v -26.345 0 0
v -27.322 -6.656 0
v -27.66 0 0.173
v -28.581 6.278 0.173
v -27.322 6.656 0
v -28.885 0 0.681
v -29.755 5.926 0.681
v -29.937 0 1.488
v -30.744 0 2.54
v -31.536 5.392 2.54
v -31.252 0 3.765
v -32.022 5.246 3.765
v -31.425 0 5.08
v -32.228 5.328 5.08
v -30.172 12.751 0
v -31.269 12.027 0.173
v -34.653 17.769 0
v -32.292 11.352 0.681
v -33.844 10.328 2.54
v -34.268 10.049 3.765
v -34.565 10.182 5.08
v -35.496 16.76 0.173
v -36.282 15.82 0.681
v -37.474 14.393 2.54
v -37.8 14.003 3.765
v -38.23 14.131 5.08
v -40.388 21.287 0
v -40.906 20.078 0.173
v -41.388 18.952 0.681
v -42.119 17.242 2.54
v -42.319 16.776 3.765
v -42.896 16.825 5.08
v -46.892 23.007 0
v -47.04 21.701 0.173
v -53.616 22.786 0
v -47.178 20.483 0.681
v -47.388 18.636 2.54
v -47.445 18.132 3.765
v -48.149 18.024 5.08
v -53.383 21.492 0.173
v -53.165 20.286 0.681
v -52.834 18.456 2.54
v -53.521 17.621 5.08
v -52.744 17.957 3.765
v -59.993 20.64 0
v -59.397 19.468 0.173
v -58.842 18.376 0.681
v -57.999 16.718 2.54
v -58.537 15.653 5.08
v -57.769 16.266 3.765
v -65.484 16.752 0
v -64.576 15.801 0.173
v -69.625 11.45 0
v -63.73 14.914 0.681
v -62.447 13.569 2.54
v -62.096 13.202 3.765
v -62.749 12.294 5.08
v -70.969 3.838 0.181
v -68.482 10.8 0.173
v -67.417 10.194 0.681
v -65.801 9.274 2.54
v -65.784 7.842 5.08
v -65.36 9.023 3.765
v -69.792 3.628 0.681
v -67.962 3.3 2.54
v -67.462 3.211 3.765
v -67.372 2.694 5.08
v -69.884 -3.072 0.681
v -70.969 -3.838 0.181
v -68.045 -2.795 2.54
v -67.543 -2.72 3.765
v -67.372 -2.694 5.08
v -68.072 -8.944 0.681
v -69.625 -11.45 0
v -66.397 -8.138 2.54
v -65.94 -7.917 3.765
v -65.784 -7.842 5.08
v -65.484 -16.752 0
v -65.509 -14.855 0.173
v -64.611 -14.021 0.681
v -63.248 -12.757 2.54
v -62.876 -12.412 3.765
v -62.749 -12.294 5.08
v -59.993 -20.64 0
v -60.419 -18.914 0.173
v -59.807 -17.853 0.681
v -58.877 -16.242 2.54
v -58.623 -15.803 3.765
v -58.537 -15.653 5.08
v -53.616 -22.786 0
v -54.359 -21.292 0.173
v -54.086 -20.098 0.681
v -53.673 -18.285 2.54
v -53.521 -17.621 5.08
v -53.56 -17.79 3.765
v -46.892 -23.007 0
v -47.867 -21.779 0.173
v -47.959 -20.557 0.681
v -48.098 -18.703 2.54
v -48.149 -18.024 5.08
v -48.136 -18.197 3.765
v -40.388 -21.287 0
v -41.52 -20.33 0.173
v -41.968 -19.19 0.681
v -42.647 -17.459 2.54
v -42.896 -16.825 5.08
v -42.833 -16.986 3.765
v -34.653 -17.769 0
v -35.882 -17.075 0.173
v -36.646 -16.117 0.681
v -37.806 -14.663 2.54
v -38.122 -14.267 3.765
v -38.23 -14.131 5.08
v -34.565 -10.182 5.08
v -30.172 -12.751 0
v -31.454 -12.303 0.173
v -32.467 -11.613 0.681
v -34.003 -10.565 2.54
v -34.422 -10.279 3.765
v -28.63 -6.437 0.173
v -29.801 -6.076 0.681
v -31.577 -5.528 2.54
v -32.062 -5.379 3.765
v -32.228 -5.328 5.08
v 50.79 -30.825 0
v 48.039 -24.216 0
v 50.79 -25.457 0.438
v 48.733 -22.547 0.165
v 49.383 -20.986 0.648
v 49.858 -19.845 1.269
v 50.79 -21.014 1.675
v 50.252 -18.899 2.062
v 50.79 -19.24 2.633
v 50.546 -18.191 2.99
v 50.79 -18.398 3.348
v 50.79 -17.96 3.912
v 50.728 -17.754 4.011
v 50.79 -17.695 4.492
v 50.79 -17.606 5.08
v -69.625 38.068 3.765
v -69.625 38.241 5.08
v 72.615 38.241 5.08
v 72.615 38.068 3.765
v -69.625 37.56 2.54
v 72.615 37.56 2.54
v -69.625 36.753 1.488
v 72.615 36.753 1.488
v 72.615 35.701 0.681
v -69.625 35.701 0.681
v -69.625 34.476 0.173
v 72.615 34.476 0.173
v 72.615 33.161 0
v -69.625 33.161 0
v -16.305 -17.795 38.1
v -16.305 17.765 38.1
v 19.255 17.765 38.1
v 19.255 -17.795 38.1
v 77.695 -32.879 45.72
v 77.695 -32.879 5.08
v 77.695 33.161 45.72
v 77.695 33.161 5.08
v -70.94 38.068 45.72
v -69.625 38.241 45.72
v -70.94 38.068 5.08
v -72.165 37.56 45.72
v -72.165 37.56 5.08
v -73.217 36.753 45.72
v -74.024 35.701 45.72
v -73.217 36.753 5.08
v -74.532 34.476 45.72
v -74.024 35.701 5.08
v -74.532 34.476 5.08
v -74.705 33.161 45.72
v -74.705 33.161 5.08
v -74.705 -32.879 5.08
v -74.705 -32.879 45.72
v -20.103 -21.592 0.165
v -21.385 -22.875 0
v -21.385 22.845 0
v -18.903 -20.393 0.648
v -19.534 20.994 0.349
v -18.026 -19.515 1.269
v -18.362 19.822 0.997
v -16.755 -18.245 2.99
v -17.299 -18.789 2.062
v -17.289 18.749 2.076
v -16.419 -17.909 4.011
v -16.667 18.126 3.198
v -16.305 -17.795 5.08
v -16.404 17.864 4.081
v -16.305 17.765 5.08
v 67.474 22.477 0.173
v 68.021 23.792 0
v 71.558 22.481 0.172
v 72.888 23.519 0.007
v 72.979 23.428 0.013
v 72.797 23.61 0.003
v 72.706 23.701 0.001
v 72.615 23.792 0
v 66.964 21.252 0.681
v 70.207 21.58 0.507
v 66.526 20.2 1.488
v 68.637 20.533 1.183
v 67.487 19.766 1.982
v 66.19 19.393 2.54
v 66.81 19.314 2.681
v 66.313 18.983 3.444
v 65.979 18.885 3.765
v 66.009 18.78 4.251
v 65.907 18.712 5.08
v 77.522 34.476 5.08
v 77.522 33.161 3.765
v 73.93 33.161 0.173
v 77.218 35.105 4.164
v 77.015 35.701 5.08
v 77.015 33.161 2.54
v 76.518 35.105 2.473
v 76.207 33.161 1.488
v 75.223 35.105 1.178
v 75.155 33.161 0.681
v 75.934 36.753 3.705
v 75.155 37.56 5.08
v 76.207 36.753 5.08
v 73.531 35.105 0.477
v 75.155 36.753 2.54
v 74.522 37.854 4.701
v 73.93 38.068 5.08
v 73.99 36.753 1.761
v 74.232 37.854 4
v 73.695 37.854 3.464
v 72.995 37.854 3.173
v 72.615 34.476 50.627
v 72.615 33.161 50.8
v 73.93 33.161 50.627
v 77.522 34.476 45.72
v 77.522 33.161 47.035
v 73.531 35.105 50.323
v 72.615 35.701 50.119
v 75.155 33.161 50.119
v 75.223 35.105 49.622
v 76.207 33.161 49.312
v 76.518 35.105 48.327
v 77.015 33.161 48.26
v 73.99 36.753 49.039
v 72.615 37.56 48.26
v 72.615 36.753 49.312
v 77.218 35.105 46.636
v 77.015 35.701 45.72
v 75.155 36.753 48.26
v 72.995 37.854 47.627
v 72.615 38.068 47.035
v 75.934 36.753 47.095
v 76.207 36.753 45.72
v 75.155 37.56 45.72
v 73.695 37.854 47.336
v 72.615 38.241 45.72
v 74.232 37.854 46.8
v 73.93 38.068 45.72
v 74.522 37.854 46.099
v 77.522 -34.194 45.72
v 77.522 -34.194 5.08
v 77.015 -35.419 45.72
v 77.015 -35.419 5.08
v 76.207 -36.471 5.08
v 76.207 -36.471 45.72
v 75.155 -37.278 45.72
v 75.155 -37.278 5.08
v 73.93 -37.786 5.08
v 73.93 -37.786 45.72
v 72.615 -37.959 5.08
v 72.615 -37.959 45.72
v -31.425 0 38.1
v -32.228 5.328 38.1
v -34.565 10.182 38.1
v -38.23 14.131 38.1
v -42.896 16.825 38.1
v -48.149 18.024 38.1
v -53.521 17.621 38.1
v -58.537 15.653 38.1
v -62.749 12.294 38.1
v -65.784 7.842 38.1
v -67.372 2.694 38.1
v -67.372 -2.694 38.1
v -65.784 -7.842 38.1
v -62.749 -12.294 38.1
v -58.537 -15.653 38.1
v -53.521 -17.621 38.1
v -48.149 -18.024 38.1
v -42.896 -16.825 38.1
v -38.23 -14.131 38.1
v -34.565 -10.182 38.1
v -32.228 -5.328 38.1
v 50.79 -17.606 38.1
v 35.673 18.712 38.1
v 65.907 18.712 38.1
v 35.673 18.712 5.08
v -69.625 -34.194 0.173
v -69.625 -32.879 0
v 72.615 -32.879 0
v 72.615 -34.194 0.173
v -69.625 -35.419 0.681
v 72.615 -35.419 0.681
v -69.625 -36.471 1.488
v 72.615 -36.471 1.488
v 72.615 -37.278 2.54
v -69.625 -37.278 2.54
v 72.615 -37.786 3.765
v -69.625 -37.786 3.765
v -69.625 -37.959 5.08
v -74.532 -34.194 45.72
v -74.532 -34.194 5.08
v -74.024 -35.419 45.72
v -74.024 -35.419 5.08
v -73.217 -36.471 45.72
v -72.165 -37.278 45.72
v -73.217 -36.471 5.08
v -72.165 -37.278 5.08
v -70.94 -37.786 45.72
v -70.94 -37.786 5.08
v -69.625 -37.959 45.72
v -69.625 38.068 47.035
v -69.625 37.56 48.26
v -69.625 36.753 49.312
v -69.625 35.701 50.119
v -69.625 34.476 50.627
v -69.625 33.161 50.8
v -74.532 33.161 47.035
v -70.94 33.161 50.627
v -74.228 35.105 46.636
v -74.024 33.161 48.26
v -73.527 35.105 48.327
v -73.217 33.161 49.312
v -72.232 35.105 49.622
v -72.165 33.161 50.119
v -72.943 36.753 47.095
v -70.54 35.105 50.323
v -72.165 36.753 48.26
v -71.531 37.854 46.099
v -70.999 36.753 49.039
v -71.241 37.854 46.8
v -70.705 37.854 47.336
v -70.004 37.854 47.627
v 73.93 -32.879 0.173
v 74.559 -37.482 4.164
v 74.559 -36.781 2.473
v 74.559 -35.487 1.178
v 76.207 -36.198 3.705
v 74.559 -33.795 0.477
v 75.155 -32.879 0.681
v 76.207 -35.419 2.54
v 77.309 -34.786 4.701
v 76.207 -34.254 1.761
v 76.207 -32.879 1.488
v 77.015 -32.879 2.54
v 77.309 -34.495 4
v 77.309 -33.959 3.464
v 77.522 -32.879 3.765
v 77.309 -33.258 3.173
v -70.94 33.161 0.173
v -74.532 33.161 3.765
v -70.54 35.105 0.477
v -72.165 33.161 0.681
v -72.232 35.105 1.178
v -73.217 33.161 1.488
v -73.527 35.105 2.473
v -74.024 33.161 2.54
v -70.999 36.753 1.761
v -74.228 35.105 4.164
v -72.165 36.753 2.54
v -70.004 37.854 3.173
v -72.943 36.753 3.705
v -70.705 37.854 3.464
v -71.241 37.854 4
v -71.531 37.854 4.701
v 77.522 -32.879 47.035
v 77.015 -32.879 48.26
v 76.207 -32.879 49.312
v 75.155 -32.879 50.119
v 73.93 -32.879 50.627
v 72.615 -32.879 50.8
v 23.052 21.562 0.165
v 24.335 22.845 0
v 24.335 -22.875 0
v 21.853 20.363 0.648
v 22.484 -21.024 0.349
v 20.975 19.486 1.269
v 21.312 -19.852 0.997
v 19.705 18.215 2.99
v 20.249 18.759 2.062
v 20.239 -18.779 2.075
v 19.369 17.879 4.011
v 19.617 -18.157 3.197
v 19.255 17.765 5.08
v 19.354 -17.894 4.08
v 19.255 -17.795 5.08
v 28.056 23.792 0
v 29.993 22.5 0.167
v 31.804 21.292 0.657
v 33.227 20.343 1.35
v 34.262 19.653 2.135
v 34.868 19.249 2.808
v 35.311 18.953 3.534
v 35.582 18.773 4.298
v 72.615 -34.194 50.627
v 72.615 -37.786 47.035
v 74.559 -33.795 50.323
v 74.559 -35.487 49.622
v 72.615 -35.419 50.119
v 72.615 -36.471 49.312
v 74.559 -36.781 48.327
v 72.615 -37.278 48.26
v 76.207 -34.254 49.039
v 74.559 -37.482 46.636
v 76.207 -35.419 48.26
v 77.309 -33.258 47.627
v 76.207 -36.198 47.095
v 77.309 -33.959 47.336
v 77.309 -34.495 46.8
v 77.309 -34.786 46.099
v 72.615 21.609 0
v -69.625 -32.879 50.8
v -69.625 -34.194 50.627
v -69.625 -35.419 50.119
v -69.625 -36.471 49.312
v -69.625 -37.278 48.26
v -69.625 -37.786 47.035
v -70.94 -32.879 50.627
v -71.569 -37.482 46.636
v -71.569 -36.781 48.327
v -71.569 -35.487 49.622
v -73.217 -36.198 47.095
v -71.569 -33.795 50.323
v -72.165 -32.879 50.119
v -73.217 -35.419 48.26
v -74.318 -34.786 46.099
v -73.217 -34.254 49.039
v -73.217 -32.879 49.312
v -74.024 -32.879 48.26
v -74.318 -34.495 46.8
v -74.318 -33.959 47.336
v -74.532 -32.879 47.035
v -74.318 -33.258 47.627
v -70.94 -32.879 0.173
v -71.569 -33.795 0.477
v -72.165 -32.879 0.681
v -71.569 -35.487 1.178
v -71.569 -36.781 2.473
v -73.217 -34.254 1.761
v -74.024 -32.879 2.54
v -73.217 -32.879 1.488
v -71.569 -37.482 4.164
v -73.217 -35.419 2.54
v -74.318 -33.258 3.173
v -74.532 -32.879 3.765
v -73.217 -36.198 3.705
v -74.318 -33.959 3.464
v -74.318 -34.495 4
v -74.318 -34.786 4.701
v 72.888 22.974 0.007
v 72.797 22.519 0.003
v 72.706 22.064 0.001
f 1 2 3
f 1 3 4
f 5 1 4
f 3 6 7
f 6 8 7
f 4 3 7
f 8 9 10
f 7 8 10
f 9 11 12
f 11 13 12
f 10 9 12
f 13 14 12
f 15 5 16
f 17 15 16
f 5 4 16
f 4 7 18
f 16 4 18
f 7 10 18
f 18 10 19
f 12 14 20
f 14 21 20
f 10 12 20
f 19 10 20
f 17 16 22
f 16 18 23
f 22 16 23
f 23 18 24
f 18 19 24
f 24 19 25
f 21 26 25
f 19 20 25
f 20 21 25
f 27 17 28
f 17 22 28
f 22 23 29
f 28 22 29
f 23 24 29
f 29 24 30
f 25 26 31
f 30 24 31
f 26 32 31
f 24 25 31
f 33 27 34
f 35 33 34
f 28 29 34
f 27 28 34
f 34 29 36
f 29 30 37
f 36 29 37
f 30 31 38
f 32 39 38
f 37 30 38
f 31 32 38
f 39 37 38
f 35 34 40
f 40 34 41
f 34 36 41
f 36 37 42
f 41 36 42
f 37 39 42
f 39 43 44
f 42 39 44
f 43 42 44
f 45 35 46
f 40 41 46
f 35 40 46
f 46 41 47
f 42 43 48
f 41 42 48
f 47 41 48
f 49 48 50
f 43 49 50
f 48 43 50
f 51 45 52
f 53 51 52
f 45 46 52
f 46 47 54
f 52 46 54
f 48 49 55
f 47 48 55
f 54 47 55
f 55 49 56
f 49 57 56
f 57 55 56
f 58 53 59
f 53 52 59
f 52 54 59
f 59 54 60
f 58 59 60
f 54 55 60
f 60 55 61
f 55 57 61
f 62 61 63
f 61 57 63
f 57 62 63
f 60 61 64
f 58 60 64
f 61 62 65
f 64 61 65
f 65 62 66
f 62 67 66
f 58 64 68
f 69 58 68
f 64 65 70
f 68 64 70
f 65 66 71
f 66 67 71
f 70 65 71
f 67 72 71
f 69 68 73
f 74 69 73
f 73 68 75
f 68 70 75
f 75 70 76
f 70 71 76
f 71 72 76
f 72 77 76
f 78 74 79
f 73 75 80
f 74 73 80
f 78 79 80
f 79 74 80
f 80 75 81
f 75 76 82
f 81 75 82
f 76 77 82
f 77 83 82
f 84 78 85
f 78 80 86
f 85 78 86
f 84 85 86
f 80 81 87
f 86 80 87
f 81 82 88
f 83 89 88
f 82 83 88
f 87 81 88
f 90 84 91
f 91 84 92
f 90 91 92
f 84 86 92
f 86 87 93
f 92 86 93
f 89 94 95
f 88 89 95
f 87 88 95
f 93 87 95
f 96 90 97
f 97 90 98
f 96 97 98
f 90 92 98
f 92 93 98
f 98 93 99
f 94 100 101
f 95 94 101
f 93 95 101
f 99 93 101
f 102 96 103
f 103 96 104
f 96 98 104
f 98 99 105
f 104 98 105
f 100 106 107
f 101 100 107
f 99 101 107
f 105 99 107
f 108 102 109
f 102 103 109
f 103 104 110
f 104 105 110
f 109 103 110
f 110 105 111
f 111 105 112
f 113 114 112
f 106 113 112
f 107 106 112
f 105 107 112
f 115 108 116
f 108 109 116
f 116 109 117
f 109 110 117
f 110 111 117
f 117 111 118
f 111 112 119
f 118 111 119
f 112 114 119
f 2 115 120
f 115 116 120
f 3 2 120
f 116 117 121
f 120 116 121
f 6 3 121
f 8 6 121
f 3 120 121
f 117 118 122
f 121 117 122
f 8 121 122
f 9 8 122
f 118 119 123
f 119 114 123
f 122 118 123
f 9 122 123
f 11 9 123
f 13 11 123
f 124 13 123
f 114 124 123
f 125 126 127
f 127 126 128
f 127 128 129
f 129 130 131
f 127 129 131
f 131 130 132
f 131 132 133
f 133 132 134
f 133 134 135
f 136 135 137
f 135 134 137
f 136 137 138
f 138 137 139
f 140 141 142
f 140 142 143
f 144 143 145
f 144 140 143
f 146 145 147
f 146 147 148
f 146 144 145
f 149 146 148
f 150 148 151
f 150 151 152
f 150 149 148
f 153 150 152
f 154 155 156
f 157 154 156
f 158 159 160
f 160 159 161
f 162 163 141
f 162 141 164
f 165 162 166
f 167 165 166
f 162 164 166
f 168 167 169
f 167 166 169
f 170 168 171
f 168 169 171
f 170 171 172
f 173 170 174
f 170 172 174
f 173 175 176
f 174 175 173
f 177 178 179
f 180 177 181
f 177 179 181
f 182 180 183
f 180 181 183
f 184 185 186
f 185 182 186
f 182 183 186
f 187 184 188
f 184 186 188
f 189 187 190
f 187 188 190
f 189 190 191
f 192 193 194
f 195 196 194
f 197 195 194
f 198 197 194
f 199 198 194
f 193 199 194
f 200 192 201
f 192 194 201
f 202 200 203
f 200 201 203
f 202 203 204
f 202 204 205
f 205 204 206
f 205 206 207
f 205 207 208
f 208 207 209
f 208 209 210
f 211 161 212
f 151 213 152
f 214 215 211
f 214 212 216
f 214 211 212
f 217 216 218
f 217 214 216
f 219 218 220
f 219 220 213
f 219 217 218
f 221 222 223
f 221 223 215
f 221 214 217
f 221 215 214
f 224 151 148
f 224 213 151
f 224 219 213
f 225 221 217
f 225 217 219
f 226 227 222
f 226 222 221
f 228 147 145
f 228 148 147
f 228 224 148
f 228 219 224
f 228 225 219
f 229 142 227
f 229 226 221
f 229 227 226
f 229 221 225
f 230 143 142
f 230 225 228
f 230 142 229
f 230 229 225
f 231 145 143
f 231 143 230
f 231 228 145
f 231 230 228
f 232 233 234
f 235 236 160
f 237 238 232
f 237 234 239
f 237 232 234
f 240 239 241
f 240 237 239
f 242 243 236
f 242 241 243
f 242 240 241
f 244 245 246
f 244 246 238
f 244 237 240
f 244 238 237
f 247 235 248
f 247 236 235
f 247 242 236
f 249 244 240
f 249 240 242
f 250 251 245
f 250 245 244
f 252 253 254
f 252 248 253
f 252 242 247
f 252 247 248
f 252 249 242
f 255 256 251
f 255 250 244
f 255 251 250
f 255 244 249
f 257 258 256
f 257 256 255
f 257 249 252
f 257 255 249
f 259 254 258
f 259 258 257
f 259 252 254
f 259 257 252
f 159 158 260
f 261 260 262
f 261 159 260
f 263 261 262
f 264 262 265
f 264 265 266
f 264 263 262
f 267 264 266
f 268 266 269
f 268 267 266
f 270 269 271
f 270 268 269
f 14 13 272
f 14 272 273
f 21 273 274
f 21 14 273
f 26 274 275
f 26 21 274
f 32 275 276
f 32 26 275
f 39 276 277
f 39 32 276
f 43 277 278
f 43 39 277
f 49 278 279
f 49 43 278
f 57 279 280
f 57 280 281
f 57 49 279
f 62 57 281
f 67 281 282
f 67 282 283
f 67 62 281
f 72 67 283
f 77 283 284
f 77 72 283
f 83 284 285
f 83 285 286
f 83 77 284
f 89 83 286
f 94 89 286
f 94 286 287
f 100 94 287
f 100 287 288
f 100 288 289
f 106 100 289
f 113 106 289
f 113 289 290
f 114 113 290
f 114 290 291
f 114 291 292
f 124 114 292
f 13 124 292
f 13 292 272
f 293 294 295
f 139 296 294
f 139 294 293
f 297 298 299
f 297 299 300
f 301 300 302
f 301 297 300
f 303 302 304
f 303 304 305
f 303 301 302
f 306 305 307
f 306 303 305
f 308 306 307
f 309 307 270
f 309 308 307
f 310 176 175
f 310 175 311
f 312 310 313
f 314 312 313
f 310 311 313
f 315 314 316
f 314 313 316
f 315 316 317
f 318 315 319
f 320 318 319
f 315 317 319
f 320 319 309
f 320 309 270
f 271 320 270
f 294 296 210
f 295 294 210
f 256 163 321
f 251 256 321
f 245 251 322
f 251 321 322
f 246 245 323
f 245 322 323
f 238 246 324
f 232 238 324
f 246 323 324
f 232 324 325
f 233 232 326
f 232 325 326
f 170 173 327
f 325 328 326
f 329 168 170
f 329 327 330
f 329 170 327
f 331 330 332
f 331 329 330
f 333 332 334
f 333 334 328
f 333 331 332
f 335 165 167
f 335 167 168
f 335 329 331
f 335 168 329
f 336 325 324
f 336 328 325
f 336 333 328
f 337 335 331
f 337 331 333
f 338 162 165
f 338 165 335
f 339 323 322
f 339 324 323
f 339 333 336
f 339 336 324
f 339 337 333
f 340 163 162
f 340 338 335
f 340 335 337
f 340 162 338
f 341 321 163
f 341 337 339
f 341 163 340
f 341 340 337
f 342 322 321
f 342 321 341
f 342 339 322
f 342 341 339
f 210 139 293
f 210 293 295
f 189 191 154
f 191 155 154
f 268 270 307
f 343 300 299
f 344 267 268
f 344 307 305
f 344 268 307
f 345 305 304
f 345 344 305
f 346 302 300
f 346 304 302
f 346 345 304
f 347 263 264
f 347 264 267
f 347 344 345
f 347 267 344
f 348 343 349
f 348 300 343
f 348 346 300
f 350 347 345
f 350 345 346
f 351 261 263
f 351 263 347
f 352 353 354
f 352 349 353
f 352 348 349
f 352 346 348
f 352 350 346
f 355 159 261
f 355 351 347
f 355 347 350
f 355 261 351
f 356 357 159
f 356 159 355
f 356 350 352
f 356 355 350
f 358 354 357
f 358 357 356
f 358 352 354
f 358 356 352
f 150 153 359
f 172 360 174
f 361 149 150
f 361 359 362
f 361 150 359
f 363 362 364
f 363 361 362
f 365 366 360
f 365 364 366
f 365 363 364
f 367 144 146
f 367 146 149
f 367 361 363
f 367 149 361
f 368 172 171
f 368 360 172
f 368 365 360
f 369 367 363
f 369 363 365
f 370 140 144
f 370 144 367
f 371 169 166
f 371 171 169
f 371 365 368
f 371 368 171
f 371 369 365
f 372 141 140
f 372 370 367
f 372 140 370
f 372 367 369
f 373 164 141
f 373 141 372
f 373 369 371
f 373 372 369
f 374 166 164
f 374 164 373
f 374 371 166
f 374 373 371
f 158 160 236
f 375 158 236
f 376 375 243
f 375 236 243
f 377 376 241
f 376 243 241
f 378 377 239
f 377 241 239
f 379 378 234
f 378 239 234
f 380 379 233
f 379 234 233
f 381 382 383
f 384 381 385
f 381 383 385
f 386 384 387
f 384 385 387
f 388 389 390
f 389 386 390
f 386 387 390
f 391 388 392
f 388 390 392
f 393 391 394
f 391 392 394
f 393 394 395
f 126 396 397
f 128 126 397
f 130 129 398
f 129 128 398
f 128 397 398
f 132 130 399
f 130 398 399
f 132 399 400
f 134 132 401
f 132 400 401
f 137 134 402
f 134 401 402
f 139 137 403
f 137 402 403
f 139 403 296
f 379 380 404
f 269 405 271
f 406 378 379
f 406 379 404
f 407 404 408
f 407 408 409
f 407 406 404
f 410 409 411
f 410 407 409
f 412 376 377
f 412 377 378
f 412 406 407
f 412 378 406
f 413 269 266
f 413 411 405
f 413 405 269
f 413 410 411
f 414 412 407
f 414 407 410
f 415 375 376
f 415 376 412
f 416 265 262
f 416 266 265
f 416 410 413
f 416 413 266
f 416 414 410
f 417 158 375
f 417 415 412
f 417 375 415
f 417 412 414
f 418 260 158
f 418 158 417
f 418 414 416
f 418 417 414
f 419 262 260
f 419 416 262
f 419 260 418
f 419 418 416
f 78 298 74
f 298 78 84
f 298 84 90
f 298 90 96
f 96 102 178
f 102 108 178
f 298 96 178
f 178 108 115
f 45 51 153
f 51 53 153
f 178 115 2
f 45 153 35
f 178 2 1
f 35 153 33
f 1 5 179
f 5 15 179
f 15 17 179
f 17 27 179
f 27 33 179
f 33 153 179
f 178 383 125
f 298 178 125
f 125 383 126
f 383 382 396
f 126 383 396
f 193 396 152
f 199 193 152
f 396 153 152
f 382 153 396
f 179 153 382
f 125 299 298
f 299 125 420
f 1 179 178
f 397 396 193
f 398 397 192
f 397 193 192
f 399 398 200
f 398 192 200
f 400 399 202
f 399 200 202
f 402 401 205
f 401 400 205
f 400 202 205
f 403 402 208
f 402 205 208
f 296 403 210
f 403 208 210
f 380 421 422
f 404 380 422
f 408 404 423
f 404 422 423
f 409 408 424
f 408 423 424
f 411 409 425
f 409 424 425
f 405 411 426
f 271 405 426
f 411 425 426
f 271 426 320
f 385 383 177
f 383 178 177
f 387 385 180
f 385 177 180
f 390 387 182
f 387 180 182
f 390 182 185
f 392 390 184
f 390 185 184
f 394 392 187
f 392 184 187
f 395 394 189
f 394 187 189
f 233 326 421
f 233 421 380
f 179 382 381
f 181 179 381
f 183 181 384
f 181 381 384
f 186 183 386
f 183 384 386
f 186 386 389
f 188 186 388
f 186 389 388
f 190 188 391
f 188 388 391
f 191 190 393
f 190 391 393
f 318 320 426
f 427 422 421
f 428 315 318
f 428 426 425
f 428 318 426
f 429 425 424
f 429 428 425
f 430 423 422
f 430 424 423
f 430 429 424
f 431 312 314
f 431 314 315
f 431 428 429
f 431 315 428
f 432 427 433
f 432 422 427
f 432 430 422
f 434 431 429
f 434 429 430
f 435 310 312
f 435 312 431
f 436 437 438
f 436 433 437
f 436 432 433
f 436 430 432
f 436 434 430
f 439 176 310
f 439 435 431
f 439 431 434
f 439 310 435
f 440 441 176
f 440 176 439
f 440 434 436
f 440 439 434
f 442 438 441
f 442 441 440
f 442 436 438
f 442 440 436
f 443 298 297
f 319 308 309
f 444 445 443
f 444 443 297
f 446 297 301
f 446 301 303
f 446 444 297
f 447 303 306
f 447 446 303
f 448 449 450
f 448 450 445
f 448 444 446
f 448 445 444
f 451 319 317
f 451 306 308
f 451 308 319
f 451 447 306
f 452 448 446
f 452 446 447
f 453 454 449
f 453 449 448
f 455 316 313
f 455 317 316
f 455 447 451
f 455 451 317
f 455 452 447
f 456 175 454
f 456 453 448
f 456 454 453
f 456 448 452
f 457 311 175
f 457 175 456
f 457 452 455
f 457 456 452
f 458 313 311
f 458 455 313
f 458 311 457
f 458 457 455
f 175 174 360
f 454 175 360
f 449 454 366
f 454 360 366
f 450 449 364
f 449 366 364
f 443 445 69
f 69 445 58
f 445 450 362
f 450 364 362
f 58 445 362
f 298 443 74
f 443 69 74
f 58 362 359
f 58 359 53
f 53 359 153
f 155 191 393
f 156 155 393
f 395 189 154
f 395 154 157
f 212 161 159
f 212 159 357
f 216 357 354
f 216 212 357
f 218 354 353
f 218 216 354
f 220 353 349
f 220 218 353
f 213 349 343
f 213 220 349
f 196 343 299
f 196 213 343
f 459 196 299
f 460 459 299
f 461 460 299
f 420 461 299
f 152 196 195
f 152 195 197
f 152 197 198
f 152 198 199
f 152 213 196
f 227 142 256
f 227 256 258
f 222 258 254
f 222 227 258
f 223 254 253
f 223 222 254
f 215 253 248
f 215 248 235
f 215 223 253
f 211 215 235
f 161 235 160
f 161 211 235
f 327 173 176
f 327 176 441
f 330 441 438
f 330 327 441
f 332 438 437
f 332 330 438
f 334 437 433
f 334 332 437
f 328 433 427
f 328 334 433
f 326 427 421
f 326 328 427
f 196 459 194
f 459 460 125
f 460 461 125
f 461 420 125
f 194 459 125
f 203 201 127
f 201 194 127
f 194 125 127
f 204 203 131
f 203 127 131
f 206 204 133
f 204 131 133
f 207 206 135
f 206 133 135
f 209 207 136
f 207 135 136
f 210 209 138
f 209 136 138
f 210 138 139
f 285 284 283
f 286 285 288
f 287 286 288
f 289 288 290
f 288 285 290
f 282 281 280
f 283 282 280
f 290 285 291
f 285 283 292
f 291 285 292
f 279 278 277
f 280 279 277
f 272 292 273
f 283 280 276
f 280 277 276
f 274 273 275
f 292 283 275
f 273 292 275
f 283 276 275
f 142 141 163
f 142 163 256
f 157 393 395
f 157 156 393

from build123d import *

# Parameters (mm, degrees)
F0_W          = 152.4
F0_H          = 76.2
F1_DEPTH      = 50.8
F2_R          = 18.0745305817
F3_DEPTH      = 38.1
F6_DEPTH      = 38.1
F4_W          = 35.56
F4_H          = 35.56
F7_DEPTH      = 38.1
F8_T1_DEPTH   = 35.56
F8_T3_DEPTH   = 35.56
F8_T5_DEPTH   = 142.24
F8_T7_DEPTH   = 66.04
F8_T9_DEPTH   = 40.64
F8_S13_W      = 5.08
F8_S13_H      = 5.08
F8_T14_DEPTH  = 5.08
F8_S19_W      = 5.08
F8_S19_H      = 5.08
F8_T20_DEPTH  = 5.08
F8_S25_W      = 5.08
F8_S25_H      = 5.08
F8_T26_DEPTH  = 5.08
F8_S31_W      = 5.08
F8_S31_H      = 5.08
F8_T32_DEPTH  = 5.08
F8_S37_W      = 5.08
F8_S37_H      = 5.08
F8_T38_DEPTH  = 5.08
F8_S43_W      = 5.08
F8_S43_H      = 5.08
F8_T44_DEPTH  = 5.08
F8_S49_W      = 5.08
F8_S49_H      = 5.08
F8_T50_DEPTH  = 5.08
F8_S55_W      = 5.08
F8_S55_H      = 5.08
F8_T56_DEPTH  = 5.08
F8_T64_DEPTH  = 64.7384888256
F8_T70_DEPTH  = 64.7384888256
F8_T76_DEPTH  = 55.6341915667
F8_T83_DEPTH  = 48.26
F8_T87_DEPTH  = 48.26
F8_T94_DEPTH  = 48.26
F8_T98_DEPTH  = 48.26
F8_T105_DEPTH = 48.26
F8_T109_DEPTH = 48.26
F8_T116_DEPTH = 48.26
F8_T120_DEPTH = 48.26
F8_T127_DEPTH = 64.7384888256
F8_T131_DEPTH = 55.6341915667
F8_T138_DEPTH = 64.7384888256
F8_T142_DEPTH = 64.7384888256
F8_T149_DEPTH = 55.6341915667
F8_T153_DEPTH = 64.7384888256


# Not quite as in the source:
# - a fillet or chamfer that OpenCascade refuses, or shapes differently, is made with other operations: its cross-section is extruded or revolved along the edge and cut away or added


with BuildPart() as f1:
    # F0 (on Top) → F1 (new body)
    with BuildSketch(Plane.XY):
        with Locations((1.4952687383, 0.1409448402)):
            Rectangle(F0_W, F0_H)
    extrude(amount=F1_DEPTH)

    # F2 (on Top) → F3 (cut)
    with BuildSketch(Plane.XY):
        with Locations((-49.4992733002, 0)):
            Circle(F2_R)
    extrude(amount=F3_DEPTH, mode=Mode.SUBTRACT)

    # F5 (on Top) → F6 (cut)
    with BuildSketch(Plane.XY):
        Polygon((50.7897567004, 18.7120139599), (35.672660917, 18.7120139599), (50.7897567004, -17.6058895886), align=None)
        Polygon((65.9068524837, 18.7120139599), (50.7897567004, 18.7120139599), (50.7897567004, -17.6058895886), align=None)
    extrude(amount=F6_DEPTH, mode=Mode.SUBTRACT)

    # F4 (on Top) → F7 (cut)
    with BuildSketch(Plane.XY):
        with Locations((1.4748377725, -0.014944126)):
            Rectangle(F4_W, F4_H)
    extrude(amount=F7_DEPTH, mode=Mode.SUBTRACT)

    # F8: fillet of radius 5.08 on 20 edges, made by hand

    # F8_s2 → F8_t1 (cut)
    with BuildSketch(Plane.YZ.offset(-16.3051622275)):
        with BuildLine():
            ThreePointArc((-22.874944126, 0), (-19.2828416775, 1.4878975516), (-17.794944126, 5.08))
            Line((-17.794944126, 5.08), (-17.794944126, 0))
            Line((-17.794944126, 0), (-22.874944126, 0))
        make_face()
        with BuildLine():
            ThreePointArc((22.845055874, 0), (19.2529534256, 1.4878975516), (17.765055874, 5.08))
            Line((17.765055874, 5.08), (17.765055874, 0))
            Line((17.765055874, 0), (22.845055874, 0))
        make_face()
    extrude(amount=F8_T1_DEPTH, mode=Mode.SUBTRACT)

    # F8_s4 → F8_t3 (cut)
    with BuildSketch(Plane.XZ.offset(-17.765055874)):
        with BuildLine():
            ThreePointArc((-21.3851622275, 0), (-17.793059779, 1.4878975516), (-16.3051622275, 5.08))
            Line((-16.3051622275, 5.08), (-16.3051622275, 0))
            Line((-16.3051622275, 0), (-21.3851622275, 0))
        make_face()
        with BuildLine():
            ThreePointArc((24.3348377725, 0), (20.7427353241, 1.4878975516), (19.2548377725, 5.08))
            Line((19.2548377725, 5.08), (19.2548377725, 0))
            Line((19.2548377725, 0), (24.3348377725, 0))
        make_face()
    extrude(amount=F8_T3_DEPTH, mode=Mode.SUBTRACT)

    # F8_s6 → F8_t5 (cut)
    with BuildSketch(Plane.YZ.offset(-69.6247312617)):
        with BuildLine():
            ThreePointArc((38.2409448402, 5.08), (36.7530472886, 1.4878975516), (33.1609448402, 0))
            Line((33.1609448402, 0), (38.2409448402, 0))
            Line((38.2409448402, 0), (38.2409448402, 5.08))
        make_face()
        with BuildLine():
            ThreePointArc((-32.8790551598, 0), (-36.4711576083, 1.4878975516), (-37.9590551598, 5.08))
            Line((-37.9590551598, 5.08), (-37.9590551598, 0))
            Line((-37.9590551598, 0), (-32.8790551598, 0))
        make_face()
        with BuildLine():
            ThreePointArc((38.2409448402, 45.72), (36.7530472886, 49.3121024484), (33.1609448402, 50.8))
            Line((33.1609448402, 50.8), (38.2409448402, 50.8))
            Line((38.2409448402, 50.8), (38.2409448402, 45.72))
        make_face()
        with BuildLine():
            ThreePointArc((-32.8790551598, 50.8), (-36.4711576083, 49.3121024484), (-37.9590551598, 45.72))
            Line((-37.9590551598, 45.72), (-37.9590551598, 50.8))
            Line((-37.9590551598, 50.8), (-32.8790551598, 50.8))
        make_face()
    extrude(amount=F8_T5_DEPTH, mode=Mode.SUBTRACT)

    # F8_s8 → F8_t7 (cut)
    with BuildSketch(Plane.XZ.offset(-33.1609448402)):
        with BuildLine():
            ThreePointArc((77.6952687383, 5.08), (76.2073711867, 1.4878975516), (72.6152687383, 0))
            Line((72.6152687383, 0), (77.6952687383, 0))
            Line((77.6952687383, 0), (77.6952687383, 5.08))
        make_face()
        with BuildLine():
            ThreePointArc((-74.7047312617, 5.08), (-73.2168337102, 1.4878975516), (-69.6247312617, 0))
            Line((-69.6247312617, 0), (-74.7047312617, 0))
            Line((-74.7047312617, 0), (-74.7047312617, 5.08))
        make_face()
        with BuildLine():
            ThreePointArc((-74.7047312617, 45.72), (-73.2168337102, 49.3121024484), (-69.6247312617, 50.8))
            Line((-69.6247312617, 50.8), (-74.7047312617, 50.8))
            Line((-74.7047312617, 50.8), (-74.7047312617, 45.72))
        make_face()
        with BuildLine():
            ThreePointArc((77.6952687383, 45.72), (76.2073711867, 49.3121024484), (72.6152687383, 50.8))
            Line((72.6152687383, 50.8), (77.6952687383, 50.8))
            Line((77.6952687383, 50.8), (77.6952687383, 45.72))
        make_face()
    extrude(amount=F8_T7_DEPTH, mode=Mode.SUBTRACT)

    # F8_s10 → F8_t9 (cut)
    with BuildSketch(Plane.XY.offset(5.08)):
        with BuildLine():
            ThreePointArc((72.6152687383, 38.2409448402), (76.2073711867, 36.7530472886), (77.6952687383, 33.1609448402))
            Line((77.6952687383, 33.1609448402), (77.6952687383, 38.2409448402))
            Line((77.6952687383, 38.2409448402), (72.6152687383, 38.2409448402))
        make_face()
        with BuildLine():
            ThreePointArc((77.6952687383, -32.8790551598), (76.2073711867, -36.4711576083), (72.6152687383, -37.9590551598))
            Line((72.6152687383, -37.9590551598), (77.6952687383, -37.9590551598))
            Line((77.6952687383, -37.9590551598), (77.6952687383, -32.8790551598))
        make_face()
        with BuildLine():
            ThreePointArc((-74.7047312617, -32.8790551598), (-73.2168337102, -36.4711576083), (-69.6247312617, -37.9590551598))
            Line((-69.6247312617, -37.9590551598), (-74.7047312617, -37.9590551598))
            Line((-74.7047312617, -37.9590551598), (-74.7047312617, -32.8790551598))
        make_face()
        with BuildLine():
            ThreePointArc((-69.6247312617, 38.2409448402), (-73.2168337102, 36.7530472886), (-74.7047312617, 33.1609448402))
            Line((-74.7047312617, 33.1609448402), (-74.7047312617, 38.2409448402))
            Line((-74.7047312617, 38.2409448402), (-69.6247312617, 38.2409448402))
        make_face()
    extrude(amount=F8_T9_DEPTH, mode=Mode.SUBTRACT)


with BuildPart() as f8_tool12:
    # F8_s13 → F8_t14 (new body)
    with BuildSketch(Plane.XZ.offset(-33.1609448402)):
        with Locations((75.1552687383, 2.54)):
            Rectangle(F8_S13_W, F8_S13_H)
    extrude(amount=-F8_T14_DEPTH)

    # F8_s15 → F8_t16 (revolve, cut)
    with BuildSketch(Plane(origin=(72.6152687383, 33.1609448402, 5.08), x_dir=(-0.7071067812, 0, 0.7071067812), z_dir=(-0.7071067812, 0, -0.7071067812))):
        with BuildLine():
            ThreePointArc((0, -5.08), (5.08, 0), (0, 5.08))
            Line((0, 5.08), (0, -5.08))
        make_face()
    revolve(axis=Axis((72.6152687383, 33.1609448402, 5.08), (0, 1, 0)), mode=Mode.SUBTRACT)


with BuildPart() as f1_1:
    add(f1.part)

    # F8_t11: cut F8_tool12
    add(f8_tool12.part, mode=Mode.SUBTRACT)


with BuildPart() as f8_tool18:
    # F8_s19 → F8_t20 (new body)
    with BuildSketch(Plane.XZ.offset(-33.1609448402)):
        with Locations((-72.1647312617, 2.54)):
            Rectangle(F8_S19_W, F8_S19_H)
    extrude(amount=-F8_T20_DEPTH)

    # F8_s21 → F8_t22 (revolve, cut)
    with BuildSketch(Plane(origin=(-69.6247312617, 33.1609448402, 5.08), x_dir=(0.7071067812, 0, 0.7071067812), z_dir=(-0.7071067812, 0, 0.7071067812))):
        with BuildLine():
            ThreePointArc((0, -5.08), (5.08, 0), (0, 5.08))
            Line((0, 5.08), (0, -5.08))
        make_face()
    revolve(axis=Axis((-69.6247312617, 33.1609448402, 5.08), (0, 1, 0)), mode=Mode.SUBTRACT)


with BuildPart() as f1_2:
    add(f1_1.part)

    # F8_t17: cut F8_tool18
    add(f8_tool18.part, mode=Mode.SUBTRACT)


with BuildPart() as f8_tool24:
    # F8_s25 → F8_t26 (new body)
    with BuildSketch(Plane.YZ.offset(72.6152687383)):
        with Locations((-35.4190551598, 2.54)):
            Rectangle(F8_S25_W, F8_S25_H)
    extrude(amount=F8_T26_DEPTH)

    # F8_s27 → F8_t28 (revolve, cut)
    with BuildSketch(Plane(origin=(72.6152687383, -32.8790551598, 5.08), x_dir=(0, 0.7071067812, 0.7071067812), z_dir=(0, 0.7071067812, -0.7071067812))):
        with BuildLine():
            ThreePointArc((0, -5.08), (5.08, 0), (0, 5.08))
            Line((0, 5.08), (0, -5.08))
        make_face()
    revolve(axis=Axis((72.6152687383, -32.8790551598, 5.08), (1, 0, 0)), mode=Mode.SUBTRACT)


with BuildPart() as f1_3:
    add(f1_2.part)

    # F8_t23: cut F8_tool24
    add(f8_tool24.part, mode=Mode.SUBTRACT)


with BuildPart() as f8_tool30:
    # F8_s31 → F8_t32 (new body)
    with BuildSketch(Plane.YZ.offset(-69.6247312617)):
        with Locations((-35.4190551598, 2.54)):
            Rectangle(F8_S31_W, F8_S31_H)
    extrude(amount=-F8_T32_DEPTH)

    # F8_s33 → F8_t34 (revolve, cut)
    with BuildSketch(Plane(origin=(-69.6247312617, -32.8790551598, 5.08), x_dir=(0, 0.7071067812, 0.7071067812), z_dir=(0, -0.7071067812, 0.7071067812))):
        with BuildLine():
            ThreePointArc((0, -5.08), (5.08, 0), (0, 5.08))
            Line((0, 5.08), (0, -5.08))
        make_face()
    revolve(axis=Axis((-69.6247312617, -32.8790551598, 5.08), (-1, 0, 0)), mode=Mode.SUBTRACT)


with BuildPart() as f1_4:
    add(f1_3.part)

    # F8_t29: cut F8_tool30
    add(f8_tool30.part, mode=Mode.SUBTRACT)


with BuildPart() as f8_tool36:
    # F8_s37 → F8_t38 (new body)
    with BuildSketch(Plane.XZ.offset(-33.1609448402)):
        with Locations((75.1552687383, 48.26)):
            Rectangle(F8_S37_W, F8_S37_H)
    extrude(amount=-F8_T38_DEPTH)

    # F8_s39 → F8_t40 (revolve, cut)
    with BuildSketch(Plane(origin=(72.6152687383, 33.1609448402, 45.72), x_dir=(-0.7071067812, 0, -0.7071067812), z_dir=(0.7071067812, 0, -0.7071067812))):
        with BuildLine():
            ThreePointArc((0, -5.08), (5.08, 0), (0, 5.08))
            Line((0, 5.08), (0, -5.08))
        make_face()
    revolve(axis=Axis((72.6152687383, 33.1609448402, 45.72), (0, 1, 0)), mode=Mode.SUBTRACT)


with BuildPart() as f1_5:
    add(f1_4.part)

    # F8_t35: cut F8_tool36
    add(f8_tool36.part, mode=Mode.SUBTRACT)


with BuildPart() as f8_tool42:
    # F8_s43 → F8_t44 (new body)
    with BuildSketch(Plane.YZ.offset(72.6152687383)):
        with Locations((-35.4190551598, 48.26)):
            Rectangle(F8_S43_W, F8_S43_H)
    extrude(amount=F8_T44_DEPTH)

    # F8_s45 → F8_t46 (revolve, cut)
    with BuildSketch(Plane(origin=(72.6152687383, -32.8790551598, 45.72), x_dir=(0, 0.7071067812, -0.7071067812), z_dir=(0, -0.7071067812, -0.7071067812))):
        with BuildLine():
            ThreePointArc((0, -5.08), (5.08, 0), (0, 5.08))
            Line((0, 5.08), (0, -5.08))
        make_face()
    revolve(axis=Axis((72.6152687383, -32.8790551598, 45.72), (1, 0, 0)), mode=Mode.SUBTRACT)


with BuildPart() as f1_6:
    add(f1_5.part)

    # F8_t41: cut F8_tool42
    add(f8_tool42.part, mode=Mode.SUBTRACT)


with BuildPart() as f8_tool48:
    # F8_s49 → F8_t50 (new body)
    with BuildSketch(Plane.YZ.offset(-69.6247312617)):
        with Locations((-35.4190551598, 48.26)):
            Rectangle(F8_S49_W, F8_S49_H)
    extrude(amount=-F8_T50_DEPTH)

    # F8_s51 → F8_t52 (revolve, cut)
    with BuildSketch(Plane(origin=(-69.6247312617, -32.8790551598, 45.72), x_dir=(0, 0.7071067812, -0.7071067812), z_dir=(0, 0.7071067812, 0.7071067812))):
        with BuildLine():
            ThreePointArc((0, -5.08), (5.08, 0), (0, 5.08))
            Line((0, 5.08), (0, -5.08))
        make_face()
    revolve(axis=Axis((-69.6247312617, -32.8790551598, 45.72), (-1, 0, 0)), mode=Mode.SUBTRACT)


with BuildPart() as f1_7:
    add(f1_6.part)

    # F8_t47: cut F8_tool48
    add(f8_tool48.part, mode=Mode.SUBTRACT)


with BuildPart() as f8_tool54:
    # F8_s55 → F8_t56 (new body)
    with BuildSketch(Plane.XZ.offset(-33.1609448402)):
        with Locations((-72.1647312617, 48.26)):
            Rectangle(F8_S55_W, F8_S55_H)
    extrude(amount=-F8_T56_DEPTH)

    # F8_s57 → F8_t58 (revolve, cut)
    with BuildSketch(Plane(origin=(-69.6247312617, 33.1609448402, 45.72), x_dir=(0.7071067812, 0, -0.7071067812), z_dir=(0.7071067812, 0, 0.7071067812))):
        with BuildLine():
            ThreePointArc((0, -5.08), (5.08, 0), (0, 5.08))
            Line((0, 5.08), (0, -5.08))
        make_face()
    revolve(axis=Axis((-69.6247312617, 33.1609448402, 45.72), (0, 1, 0)), mode=Mode.SUBTRACT)


with BuildPart() as f1_8:
    add(f1_7.part)

    # F8_t53: cut F8_tool54
    add(f8_tool54.part, mode=Mode.SUBTRACT)

    # F8_s59 → F8_t60 (revolve, cut)
    with BuildSketch(Plane.XZ):
        with BuildLine():
            ThreePointArc((-26.3447427184, 0), (-29.9368451669, 1.4878975516), (-31.4247427184, 5.08))
            Line((-31.4247427184, 5.08), (-31.4247427184, 0))
            Line((-31.4247427184, 0), (-26.3447427184, 0))
        make_face()
    revolve(axis=Axis((-49.4992733002, 0, 0), (0, 0, 1)), mode=Mode.SUBTRACT)


with BuildPart() as f8_tool62:
    # F8_s63 → F8_t64 (new body)
    with BuildSketch(Plane(origin=(-6.2510630726, 15.0177989873, 0), x_dir=(0, 0, 1), z_dir=(0.384282575, -0.9232155233, 0))):
        with BuildLine():
            ThreePointArc((0, -35.0442552258), (1.4878975516, -38.6363576742), (5.08, -40.1242552258))
            Line((5.08, -40.1242552258), (0, -40.1242552258))
            Line((0, -40.1242552258), (0, -35.0442552258))
        make_face()
    extrude(amount=F8_T64_DEPTH)

    split(bisect_by=Plane.XZ.offset(-18.7120139599), keep=Keep.TOP)

    split(bisect_by=Plane(origin=(49.535616731, -20.6188846174, 0), x_dir=(0, 0, 1), z_dir=(-0.9232155233, 0.384282575, 0)), keep=Keep.TOP)


with BuildPart() as f1_9:
    add(f1_8.part)

    # F8_t61: cut F8_tool62
    add(f8_tool62.part, mode=Mode.SUBTRACT)


with BuildPart() as f8_tool68:
    # F8_s69 → F8_t70 (new body)
    with BuildSketch(Plane(origin=(-3.6262487334, -8.7118421177, 0), x_dir=(0, 0, 1), z_dir=(0.384282575, 0.9232155233, 0))):
        with BuildLine():
            ThreePointArc((0, 58.7355283991), (1.4878975516, 55.1434259507), (5.08, 53.6555283991))
            Line((5.08, 53.6555283991), (0, 53.6555283991))
            Line((0, 53.6555283991), (0, 58.7355283991))
        make_face()
    extrude(amount=F8_T70_DEPTH)

    split(bisect_by=Plane(origin=(37.0433352869, 15.419052119, 0), x_dir=(0, 0, 1), z_dir=(0.9232155233, 0.384282575, 0)), keep=Keep.TOP)

    split(bisect_by=Plane.XZ.offset(-18.7120139599), keep=Keep.TOP)


with BuildPart() as f1_10:
    add(f1_9.part)

    # F8_t67: cut F8_tool68
    add(f8_tool68.part, mode=Mode.SUBTRACT)


with BuildPart() as f8_tool74:
    # F8_s75 → F8_t76 (new body)
    with BuildSketch(Plane.YZ.offset(78.6068524837)):
        with BuildLine():
            ThreePointArc((23.7920139599, 0), (20.1999115115, 1.4878975516), (18.7120139599, 5.08))
            Line((18.7120139599, 5.08), (18.7120139599, 0))
            Line((18.7120139599, 0), (23.7920139599, 0))
        make_face()
    extrude(amount=-F8_T76_DEPTH)

    split(bisect_by=Plane(origin=(37.0433352869, 15.419052119, 0), x_dir=(0, 0, 1), z_dir=(0.9232155233, 0.384282575, 0)), keep=Keep.TOP)

    split(bisect_by=Plane(origin=(49.535616731, -20.6188846174, 0), x_dir=(0, 0, 1), z_dir=(-0.9232155233, 0.384282575, 0)), keep=Keep.TOP)


with BuildPart() as f1_11:
    add(f1_10.part)

    # F8_t73: cut F8_tool74
    add(f8_tool74.part, mode=Mode.SUBTRACT)


with BuildPart() as f8_tool81:
    # F8_s82 → F8_t83 (new body)
    with BuildSketch(Plane.XZ.offset(-17.765055874)):
        with BuildLine():
            ThreePointArc((-21.3851622275, 0), (-17.793059779, 1.4878975516), (-16.3051622275, 5.08))
            Line((-16.3051622275, 5.08), (-16.3051622275, 0))
            Line((-16.3051622275, 0), (-21.3851622275, 0))
        make_face()
    extrude(amount=F8_T83_DEPTH)

    split(bisect_by=Plane.XZ.offset(17.794944126), keep=Keep.TOP)


with BuildPart() as f8_tool85:
    # F8_s86 → F8_t87 (new body)
    with BuildSketch(Plane.YZ.offset(-29.0051622275)):
        with BuildLine():
            ThreePointArc((-22.874944126, 0), (-19.2828416775, 1.4878975516), (-17.794944126, 5.08))
            Line((-17.794944126, 5.08), (-17.794944126, 0))
            Line((-17.794944126, 0), (-22.874944126, 0))
        make_face()
    extrude(amount=F8_T87_DEPTH)

    split(bisect_by=Plane.YZ.offset(-16.3051622275), keep=Keep.BOTTOM)


with BuildPart() as f8_tool81_1:
    add(f8_tool81.part)

    # F8_t89: intersect F8_tool85
    add(f8_tool85.part, mode=Mode.INTERSECT)


with BuildPart() as f1_12:
    add(f1_11.part)

    # F8_t79: cut F8_tool81
    add(f8_tool81_1.part, mode=Mode.SUBTRACT)


with BuildPart() as f8_tool92:
    # F8_s93 → F8_t94 (new body)
    with BuildSketch(Plane.YZ.offset(-16.3051622275)):
        with BuildLine():
            ThreePointArc((-22.874944126, 0), (-19.2828416775, 1.4878975516), (-17.794944126, 5.08))
            Line((-17.794944126, 5.08), (-17.794944126, 0))
            Line((-17.794944126, 0), (-22.874944126, 0))
        make_face()
    extrude(amount=F8_T94_DEPTH)

    split(bisect_by=Plane.YZ.offset(19.2548377725), keep=Keep.TOP)


with BuildPart() as f8_tool96:
    # F8_s97 → F8_t98 (new body)
    with BuildSketch(Plane.XZ.offset(30.494944126)):
        with BuildLine():
            ThreePointArc((24.3348377725, 0), (20.7427353241, 1.4878975516), (19.2548377725, 5.08))
            Line((19.2548377725, 5.08), (19.2548377725, 0))
            Line((19.2548377725, 0), (24.3348377725, 0))
        make_face()
    extrude(amount=-F8_T98_DEPTH)

    split(bisect_by=Plane.XZ.offset(17.794944126), keep=Keep.TOP)


with BuildPart() as f8_tool92_1:
    add(f8_tool92.part)

    # F8_t100: intersect F8_tool96
    add(f8_tool96.part, mode=Mode.INTERSECT)


with BuildPart() as f1_13:
    add(f1_12.part)

    # F8_t90: cut F8_tool92
    add(f8_tool92_1.part, mode=Mode.SUBTRACT)


with BuildPart() as f8_tool103:
    # F8_s104 → F8_t105 (new body)
    with BuildSketch(Plane.XZ.offset(-30.465055874)):
        with BuildLine():
            ThreePointArc((-21.3851622275, 0), (-17.793059779, 1.4878975516), (-16.3051622275, 5.08))
            Line((-16.3051622275, 5.08), (-16.3051622275, 0))
            Line((-16.3051622275, 0), (-21.3851622275, 0))
        make_face()
    extrude(amount=F8_T105_DEPTH)

    split(bisect_by=Plane.XZ.offset(-17.765055874), keep=Keep.BOTTOM)


with BuildPart() as f8_tool107:
    # F8_s108 → F8_t109 (new body)
    with BuildSketch(Plane.YZ.offset(19.2548377725)):
        with BuildLine():
            ThreePointArc((22.845055874, 0), (19.2529534256, 1.4878975516), (17.765055874, 5.08))
            Line((17.765055874, 5.08), (17.765055874, 0))
            Line((17.765055874, 0), (22.845055874, 0))
        make_face()
    extrude(amount=-F8_T109_DEPTH)

    split(bisect_by=Plane.YZ.offset(-16.3051622275), keep=Keep.BOTTOM)


with BuildPart() as f8_tool103_1:
    add(f8_tool103.part)

    # F8_t111: intersect F8_tool107
    add(f8_tool107.part, mode=Mode.INTERSECT)


with BuildPart() as f1_14:
    add(f1_13.part)

    # F8_t101: cut F8_tool103
    add(f8_tool103_1.part, mode=Mode.SUBTRACT)


with BuildPart() as f8_tool114:
    # F8_s115 → F8_t116 (new body)
    with BuildSketch(Plane.XZ.offset(17.794944126)):
        with BuildLine():
            ThreePointArc((24.3348377725, 0), (20.7427353241, 1.4878975516), (19.2548377725, 5.08))
            Line((19.2548377725, 5.08), (19.2548377725, 0))
            Line((19.2548377725, 0), (24.3348377725, 0))
        make_face()
    extrude(amount=-F8_T116_DEPTH)

    split(bisect_by=Plane.XZ.offset(-17.765055874), keep=Keep.BOTTOM)


with BuildPart() as f8_tool118:
    # F8_s119 → F8_t120 (new body)
    with BuildSketch(Plane.YZ.offset(31.9548377725)):
        with BuildLine():
            ThreePointArc((22.845055874, 0), (19.2529534256, 1.4878975516), (17.765055874, 5.08))
            Line((17.765055874, 5.08), (17.765055874, 0))
            Line((17.765055874, 0), (22.845055874, 0))
        make_face()
    extrude(amount=-F8_T120_DEPTH)

    split(bisect_by=Plane.YZ.offset(19.2548377725), keep=Keep.TOP)


with BuildPart() as f8_tool114_1:
    add(f8_tool114.part)

    # F8_t122: intersect F8_tool118
    add(f8_tool118.part, mode=Mode.INTERSECT)


with BuildPart() as f1_15:
    add(f1_14.part)

    # F8_t112: cut F8_tool114
    add(f8_tool114_1.part, mode=Mode.SUBTRACT)


with BuildPart() as f8_tool125:
    # F8_s126 → F8_t127 (new body)
    with BuildSketch(Plane(origin=(-6.2510630726, 15.0177989873, 0), x_dir=(0, 0, 1), z_dir=(0.384282575, -0.9232155233, 0))):
        with BuildLine():
            ThreePointArc((0, -35.0442552258), (1.4878975516, -38.6363576742), (5.08, -40.1242552258))
            Line((5.08, -40.1242552258), (0, -40.1242552258))
            Line((0, -40.1242552258), (0, -35.0442552258))
        make_face()
    extrude(amount=F8_T127_DEPTH)

    split(bisect_by=Plane.XZ.offset(-18.7120139599), keep=Keep.BOTTOM)


with BuildPart() as f8_tool129:
    # F8_s130 → F8_t131 (new body)
    with BuildSketch(Plane.YZ.offset(78.6068524837)):
        with BuildLine():
            ThreePointArc((23.7920139599, 0), (20.1999115115, 1.4878975516), (18.7120139599, 5.08))
            Line((18.7120139599, 5.08), (18.7120139599, 0))
            Line((18.7120139599, 0), (23.7920139599, 0))
        make_face()
    extrude(amount=-F8_T131_DEPTH)

    split(bisect_by=Plane(origin=(37.0433352869, 15.419052119, 0), x_dir=(0, 0, 1), z_dir=(-0.9232155233, -0.384282575, 0)), keep=Keep.TOP)


with BuildPart() as f8_tool125_1:
    add(f8_tool125.part)

    # F8_t133: intersect F8_tool129
    add(f8_tool129.part, mode=Mode.INTERSECT)


with BuildPart() as f1_16:
    add(f1_15.part)

    # F8_t123: cut F8_tool125
    add(f8_tool125_1.part, mode=Mode.SUBTRACT)


with BuildPart() as f8_tool136:
    # F8_s137 → F8_t138 (new body)
    with BuildSketch(Plane(origin=(-6.2510630726, 15.0177989873, 0), x_dir=(0, 0, 1), z_dir=(0.384282575, -0.9232155233, 0))):
        with BuildLine():
            ThreePointArc((0, -35.0442552258), (1.4878975516, -38.6363576742), (5.08, -40.1242552258))
            Line((5.08, -40.1242552258), (0, -40.1242552258))
            Line((0, -40.1242552258), (0, -35.0442552258))
        make_face()
    extrude(amount=F8_T138_DEPTH)

    split(bisect_by=Plane(origin=(49.535616731, -20.6188846174, 0), x_dir=(0, 0, 1), z_dir=(0.9232155233, -0.384282575, 0)), keep=Keep.TOP)


with BuildPart() as f8_tool140:
    # F8_s141 → F8_t142 (new body)
    with BuildSketch(Plane(origin=(-3.6262487334, -8.7118421177, 0), x_dir=(0, 0, 1), z_dir=(0.384282575, 0.9232155233, 0))):
        with BuildLine():
            ThreePointArc((0, 58.7355283991), (1.4878975516, 55.1434259507), (5.08, 53.6555283991))
            Line((5.08, 53.6555283991), (0, 53.6555283991))
            Line((0, 53.6555283991), (0, 58.7355283991))
        make_face()
    extrude(amount=F8_T142_DEPTH)

    split(bisect_by=Plane(origin=(37.0433352869, 15.419052119, 0), x_dir=(0, 0, 1), z_dir=(-0.9232155233, -0.384282575, 0)), keep=Keep.TOP)


with BuildPart() as f8_tool136_1:
    add(f8_tool136.part)

    # F8_t144: intersect F8_tool140
    add(f8_tool140.part, mode=Mode.INTERSECT)


with BuildPart() as f1_17:
    add(f1_16.part)

    # F8_t134: cut F8_tool136
    add(f8_tool136_1.part, mode=Mode.SUBTRACT)


with BuildPart() as f8_tool147:
    # F8_s148 → F8_t149 (new body)
    with BuildSketch(Plane.YZ.offset(78.6068524837)):
        with BuildLine():
            ThreePointArc((23.7920139599, 0), (20.1999115115, 1.4878975516), (18.7120139599, 5.08))
            Line((18.7120139599, 5.08), (18.7120139599, 0))
            Line((18.7120139599, 0), (23.7920139599, 0))
        make_face()
    extrude(amount=-F8_T149_DEPTH)

    split(bisect_by=Plane(origin=(49.535616731, -20.6188846174, 0), x_dir=(0, 0, 1), z_dir=(0.9232155233, -0.384282575, 0)), keep=Keep.TOP)


with BuildPart() as f8_tool151:
    # F8_s152 → F8_t153 (new body)
    with BuildSketch(Plane(origin=(-3.6262487334, -8.7118421177, 0), x_dir=(0, 0, 1), z_dir=(0.384282575, 0.9232155233, 0))):
        with BuildLine():
            ThreePointArc((0, 58.7355283991), (1.4878975516, 55.1434259507), (5.08, 53.6555283991))
            Line((5.08, 53.6555283991), (0, 53.6555283991))
            Line((0, 53.6555283991), (0, 58.7355283991))
        make_face()
    extrude(amount=F8_T153_DEPTH)

    split(bisect_by=Plane.XZ.offset(-18.7120139599), keep=Keep.BOTTOM)


with BuildPart() as f8_tool147_1:
    add(f8_tool147.part)

    # F8_t155: intersect F8_tool151
    add(f8_tool151.part, mode=Mode.INTERSECT)


with BuildPart() as f1_18:
    add(f1_17.part)

    # F8_t145: cut F8_tool147
    add(f8_tool147_1.part, mode=Mode.SUBTRACT)


solid = f1_18.part
